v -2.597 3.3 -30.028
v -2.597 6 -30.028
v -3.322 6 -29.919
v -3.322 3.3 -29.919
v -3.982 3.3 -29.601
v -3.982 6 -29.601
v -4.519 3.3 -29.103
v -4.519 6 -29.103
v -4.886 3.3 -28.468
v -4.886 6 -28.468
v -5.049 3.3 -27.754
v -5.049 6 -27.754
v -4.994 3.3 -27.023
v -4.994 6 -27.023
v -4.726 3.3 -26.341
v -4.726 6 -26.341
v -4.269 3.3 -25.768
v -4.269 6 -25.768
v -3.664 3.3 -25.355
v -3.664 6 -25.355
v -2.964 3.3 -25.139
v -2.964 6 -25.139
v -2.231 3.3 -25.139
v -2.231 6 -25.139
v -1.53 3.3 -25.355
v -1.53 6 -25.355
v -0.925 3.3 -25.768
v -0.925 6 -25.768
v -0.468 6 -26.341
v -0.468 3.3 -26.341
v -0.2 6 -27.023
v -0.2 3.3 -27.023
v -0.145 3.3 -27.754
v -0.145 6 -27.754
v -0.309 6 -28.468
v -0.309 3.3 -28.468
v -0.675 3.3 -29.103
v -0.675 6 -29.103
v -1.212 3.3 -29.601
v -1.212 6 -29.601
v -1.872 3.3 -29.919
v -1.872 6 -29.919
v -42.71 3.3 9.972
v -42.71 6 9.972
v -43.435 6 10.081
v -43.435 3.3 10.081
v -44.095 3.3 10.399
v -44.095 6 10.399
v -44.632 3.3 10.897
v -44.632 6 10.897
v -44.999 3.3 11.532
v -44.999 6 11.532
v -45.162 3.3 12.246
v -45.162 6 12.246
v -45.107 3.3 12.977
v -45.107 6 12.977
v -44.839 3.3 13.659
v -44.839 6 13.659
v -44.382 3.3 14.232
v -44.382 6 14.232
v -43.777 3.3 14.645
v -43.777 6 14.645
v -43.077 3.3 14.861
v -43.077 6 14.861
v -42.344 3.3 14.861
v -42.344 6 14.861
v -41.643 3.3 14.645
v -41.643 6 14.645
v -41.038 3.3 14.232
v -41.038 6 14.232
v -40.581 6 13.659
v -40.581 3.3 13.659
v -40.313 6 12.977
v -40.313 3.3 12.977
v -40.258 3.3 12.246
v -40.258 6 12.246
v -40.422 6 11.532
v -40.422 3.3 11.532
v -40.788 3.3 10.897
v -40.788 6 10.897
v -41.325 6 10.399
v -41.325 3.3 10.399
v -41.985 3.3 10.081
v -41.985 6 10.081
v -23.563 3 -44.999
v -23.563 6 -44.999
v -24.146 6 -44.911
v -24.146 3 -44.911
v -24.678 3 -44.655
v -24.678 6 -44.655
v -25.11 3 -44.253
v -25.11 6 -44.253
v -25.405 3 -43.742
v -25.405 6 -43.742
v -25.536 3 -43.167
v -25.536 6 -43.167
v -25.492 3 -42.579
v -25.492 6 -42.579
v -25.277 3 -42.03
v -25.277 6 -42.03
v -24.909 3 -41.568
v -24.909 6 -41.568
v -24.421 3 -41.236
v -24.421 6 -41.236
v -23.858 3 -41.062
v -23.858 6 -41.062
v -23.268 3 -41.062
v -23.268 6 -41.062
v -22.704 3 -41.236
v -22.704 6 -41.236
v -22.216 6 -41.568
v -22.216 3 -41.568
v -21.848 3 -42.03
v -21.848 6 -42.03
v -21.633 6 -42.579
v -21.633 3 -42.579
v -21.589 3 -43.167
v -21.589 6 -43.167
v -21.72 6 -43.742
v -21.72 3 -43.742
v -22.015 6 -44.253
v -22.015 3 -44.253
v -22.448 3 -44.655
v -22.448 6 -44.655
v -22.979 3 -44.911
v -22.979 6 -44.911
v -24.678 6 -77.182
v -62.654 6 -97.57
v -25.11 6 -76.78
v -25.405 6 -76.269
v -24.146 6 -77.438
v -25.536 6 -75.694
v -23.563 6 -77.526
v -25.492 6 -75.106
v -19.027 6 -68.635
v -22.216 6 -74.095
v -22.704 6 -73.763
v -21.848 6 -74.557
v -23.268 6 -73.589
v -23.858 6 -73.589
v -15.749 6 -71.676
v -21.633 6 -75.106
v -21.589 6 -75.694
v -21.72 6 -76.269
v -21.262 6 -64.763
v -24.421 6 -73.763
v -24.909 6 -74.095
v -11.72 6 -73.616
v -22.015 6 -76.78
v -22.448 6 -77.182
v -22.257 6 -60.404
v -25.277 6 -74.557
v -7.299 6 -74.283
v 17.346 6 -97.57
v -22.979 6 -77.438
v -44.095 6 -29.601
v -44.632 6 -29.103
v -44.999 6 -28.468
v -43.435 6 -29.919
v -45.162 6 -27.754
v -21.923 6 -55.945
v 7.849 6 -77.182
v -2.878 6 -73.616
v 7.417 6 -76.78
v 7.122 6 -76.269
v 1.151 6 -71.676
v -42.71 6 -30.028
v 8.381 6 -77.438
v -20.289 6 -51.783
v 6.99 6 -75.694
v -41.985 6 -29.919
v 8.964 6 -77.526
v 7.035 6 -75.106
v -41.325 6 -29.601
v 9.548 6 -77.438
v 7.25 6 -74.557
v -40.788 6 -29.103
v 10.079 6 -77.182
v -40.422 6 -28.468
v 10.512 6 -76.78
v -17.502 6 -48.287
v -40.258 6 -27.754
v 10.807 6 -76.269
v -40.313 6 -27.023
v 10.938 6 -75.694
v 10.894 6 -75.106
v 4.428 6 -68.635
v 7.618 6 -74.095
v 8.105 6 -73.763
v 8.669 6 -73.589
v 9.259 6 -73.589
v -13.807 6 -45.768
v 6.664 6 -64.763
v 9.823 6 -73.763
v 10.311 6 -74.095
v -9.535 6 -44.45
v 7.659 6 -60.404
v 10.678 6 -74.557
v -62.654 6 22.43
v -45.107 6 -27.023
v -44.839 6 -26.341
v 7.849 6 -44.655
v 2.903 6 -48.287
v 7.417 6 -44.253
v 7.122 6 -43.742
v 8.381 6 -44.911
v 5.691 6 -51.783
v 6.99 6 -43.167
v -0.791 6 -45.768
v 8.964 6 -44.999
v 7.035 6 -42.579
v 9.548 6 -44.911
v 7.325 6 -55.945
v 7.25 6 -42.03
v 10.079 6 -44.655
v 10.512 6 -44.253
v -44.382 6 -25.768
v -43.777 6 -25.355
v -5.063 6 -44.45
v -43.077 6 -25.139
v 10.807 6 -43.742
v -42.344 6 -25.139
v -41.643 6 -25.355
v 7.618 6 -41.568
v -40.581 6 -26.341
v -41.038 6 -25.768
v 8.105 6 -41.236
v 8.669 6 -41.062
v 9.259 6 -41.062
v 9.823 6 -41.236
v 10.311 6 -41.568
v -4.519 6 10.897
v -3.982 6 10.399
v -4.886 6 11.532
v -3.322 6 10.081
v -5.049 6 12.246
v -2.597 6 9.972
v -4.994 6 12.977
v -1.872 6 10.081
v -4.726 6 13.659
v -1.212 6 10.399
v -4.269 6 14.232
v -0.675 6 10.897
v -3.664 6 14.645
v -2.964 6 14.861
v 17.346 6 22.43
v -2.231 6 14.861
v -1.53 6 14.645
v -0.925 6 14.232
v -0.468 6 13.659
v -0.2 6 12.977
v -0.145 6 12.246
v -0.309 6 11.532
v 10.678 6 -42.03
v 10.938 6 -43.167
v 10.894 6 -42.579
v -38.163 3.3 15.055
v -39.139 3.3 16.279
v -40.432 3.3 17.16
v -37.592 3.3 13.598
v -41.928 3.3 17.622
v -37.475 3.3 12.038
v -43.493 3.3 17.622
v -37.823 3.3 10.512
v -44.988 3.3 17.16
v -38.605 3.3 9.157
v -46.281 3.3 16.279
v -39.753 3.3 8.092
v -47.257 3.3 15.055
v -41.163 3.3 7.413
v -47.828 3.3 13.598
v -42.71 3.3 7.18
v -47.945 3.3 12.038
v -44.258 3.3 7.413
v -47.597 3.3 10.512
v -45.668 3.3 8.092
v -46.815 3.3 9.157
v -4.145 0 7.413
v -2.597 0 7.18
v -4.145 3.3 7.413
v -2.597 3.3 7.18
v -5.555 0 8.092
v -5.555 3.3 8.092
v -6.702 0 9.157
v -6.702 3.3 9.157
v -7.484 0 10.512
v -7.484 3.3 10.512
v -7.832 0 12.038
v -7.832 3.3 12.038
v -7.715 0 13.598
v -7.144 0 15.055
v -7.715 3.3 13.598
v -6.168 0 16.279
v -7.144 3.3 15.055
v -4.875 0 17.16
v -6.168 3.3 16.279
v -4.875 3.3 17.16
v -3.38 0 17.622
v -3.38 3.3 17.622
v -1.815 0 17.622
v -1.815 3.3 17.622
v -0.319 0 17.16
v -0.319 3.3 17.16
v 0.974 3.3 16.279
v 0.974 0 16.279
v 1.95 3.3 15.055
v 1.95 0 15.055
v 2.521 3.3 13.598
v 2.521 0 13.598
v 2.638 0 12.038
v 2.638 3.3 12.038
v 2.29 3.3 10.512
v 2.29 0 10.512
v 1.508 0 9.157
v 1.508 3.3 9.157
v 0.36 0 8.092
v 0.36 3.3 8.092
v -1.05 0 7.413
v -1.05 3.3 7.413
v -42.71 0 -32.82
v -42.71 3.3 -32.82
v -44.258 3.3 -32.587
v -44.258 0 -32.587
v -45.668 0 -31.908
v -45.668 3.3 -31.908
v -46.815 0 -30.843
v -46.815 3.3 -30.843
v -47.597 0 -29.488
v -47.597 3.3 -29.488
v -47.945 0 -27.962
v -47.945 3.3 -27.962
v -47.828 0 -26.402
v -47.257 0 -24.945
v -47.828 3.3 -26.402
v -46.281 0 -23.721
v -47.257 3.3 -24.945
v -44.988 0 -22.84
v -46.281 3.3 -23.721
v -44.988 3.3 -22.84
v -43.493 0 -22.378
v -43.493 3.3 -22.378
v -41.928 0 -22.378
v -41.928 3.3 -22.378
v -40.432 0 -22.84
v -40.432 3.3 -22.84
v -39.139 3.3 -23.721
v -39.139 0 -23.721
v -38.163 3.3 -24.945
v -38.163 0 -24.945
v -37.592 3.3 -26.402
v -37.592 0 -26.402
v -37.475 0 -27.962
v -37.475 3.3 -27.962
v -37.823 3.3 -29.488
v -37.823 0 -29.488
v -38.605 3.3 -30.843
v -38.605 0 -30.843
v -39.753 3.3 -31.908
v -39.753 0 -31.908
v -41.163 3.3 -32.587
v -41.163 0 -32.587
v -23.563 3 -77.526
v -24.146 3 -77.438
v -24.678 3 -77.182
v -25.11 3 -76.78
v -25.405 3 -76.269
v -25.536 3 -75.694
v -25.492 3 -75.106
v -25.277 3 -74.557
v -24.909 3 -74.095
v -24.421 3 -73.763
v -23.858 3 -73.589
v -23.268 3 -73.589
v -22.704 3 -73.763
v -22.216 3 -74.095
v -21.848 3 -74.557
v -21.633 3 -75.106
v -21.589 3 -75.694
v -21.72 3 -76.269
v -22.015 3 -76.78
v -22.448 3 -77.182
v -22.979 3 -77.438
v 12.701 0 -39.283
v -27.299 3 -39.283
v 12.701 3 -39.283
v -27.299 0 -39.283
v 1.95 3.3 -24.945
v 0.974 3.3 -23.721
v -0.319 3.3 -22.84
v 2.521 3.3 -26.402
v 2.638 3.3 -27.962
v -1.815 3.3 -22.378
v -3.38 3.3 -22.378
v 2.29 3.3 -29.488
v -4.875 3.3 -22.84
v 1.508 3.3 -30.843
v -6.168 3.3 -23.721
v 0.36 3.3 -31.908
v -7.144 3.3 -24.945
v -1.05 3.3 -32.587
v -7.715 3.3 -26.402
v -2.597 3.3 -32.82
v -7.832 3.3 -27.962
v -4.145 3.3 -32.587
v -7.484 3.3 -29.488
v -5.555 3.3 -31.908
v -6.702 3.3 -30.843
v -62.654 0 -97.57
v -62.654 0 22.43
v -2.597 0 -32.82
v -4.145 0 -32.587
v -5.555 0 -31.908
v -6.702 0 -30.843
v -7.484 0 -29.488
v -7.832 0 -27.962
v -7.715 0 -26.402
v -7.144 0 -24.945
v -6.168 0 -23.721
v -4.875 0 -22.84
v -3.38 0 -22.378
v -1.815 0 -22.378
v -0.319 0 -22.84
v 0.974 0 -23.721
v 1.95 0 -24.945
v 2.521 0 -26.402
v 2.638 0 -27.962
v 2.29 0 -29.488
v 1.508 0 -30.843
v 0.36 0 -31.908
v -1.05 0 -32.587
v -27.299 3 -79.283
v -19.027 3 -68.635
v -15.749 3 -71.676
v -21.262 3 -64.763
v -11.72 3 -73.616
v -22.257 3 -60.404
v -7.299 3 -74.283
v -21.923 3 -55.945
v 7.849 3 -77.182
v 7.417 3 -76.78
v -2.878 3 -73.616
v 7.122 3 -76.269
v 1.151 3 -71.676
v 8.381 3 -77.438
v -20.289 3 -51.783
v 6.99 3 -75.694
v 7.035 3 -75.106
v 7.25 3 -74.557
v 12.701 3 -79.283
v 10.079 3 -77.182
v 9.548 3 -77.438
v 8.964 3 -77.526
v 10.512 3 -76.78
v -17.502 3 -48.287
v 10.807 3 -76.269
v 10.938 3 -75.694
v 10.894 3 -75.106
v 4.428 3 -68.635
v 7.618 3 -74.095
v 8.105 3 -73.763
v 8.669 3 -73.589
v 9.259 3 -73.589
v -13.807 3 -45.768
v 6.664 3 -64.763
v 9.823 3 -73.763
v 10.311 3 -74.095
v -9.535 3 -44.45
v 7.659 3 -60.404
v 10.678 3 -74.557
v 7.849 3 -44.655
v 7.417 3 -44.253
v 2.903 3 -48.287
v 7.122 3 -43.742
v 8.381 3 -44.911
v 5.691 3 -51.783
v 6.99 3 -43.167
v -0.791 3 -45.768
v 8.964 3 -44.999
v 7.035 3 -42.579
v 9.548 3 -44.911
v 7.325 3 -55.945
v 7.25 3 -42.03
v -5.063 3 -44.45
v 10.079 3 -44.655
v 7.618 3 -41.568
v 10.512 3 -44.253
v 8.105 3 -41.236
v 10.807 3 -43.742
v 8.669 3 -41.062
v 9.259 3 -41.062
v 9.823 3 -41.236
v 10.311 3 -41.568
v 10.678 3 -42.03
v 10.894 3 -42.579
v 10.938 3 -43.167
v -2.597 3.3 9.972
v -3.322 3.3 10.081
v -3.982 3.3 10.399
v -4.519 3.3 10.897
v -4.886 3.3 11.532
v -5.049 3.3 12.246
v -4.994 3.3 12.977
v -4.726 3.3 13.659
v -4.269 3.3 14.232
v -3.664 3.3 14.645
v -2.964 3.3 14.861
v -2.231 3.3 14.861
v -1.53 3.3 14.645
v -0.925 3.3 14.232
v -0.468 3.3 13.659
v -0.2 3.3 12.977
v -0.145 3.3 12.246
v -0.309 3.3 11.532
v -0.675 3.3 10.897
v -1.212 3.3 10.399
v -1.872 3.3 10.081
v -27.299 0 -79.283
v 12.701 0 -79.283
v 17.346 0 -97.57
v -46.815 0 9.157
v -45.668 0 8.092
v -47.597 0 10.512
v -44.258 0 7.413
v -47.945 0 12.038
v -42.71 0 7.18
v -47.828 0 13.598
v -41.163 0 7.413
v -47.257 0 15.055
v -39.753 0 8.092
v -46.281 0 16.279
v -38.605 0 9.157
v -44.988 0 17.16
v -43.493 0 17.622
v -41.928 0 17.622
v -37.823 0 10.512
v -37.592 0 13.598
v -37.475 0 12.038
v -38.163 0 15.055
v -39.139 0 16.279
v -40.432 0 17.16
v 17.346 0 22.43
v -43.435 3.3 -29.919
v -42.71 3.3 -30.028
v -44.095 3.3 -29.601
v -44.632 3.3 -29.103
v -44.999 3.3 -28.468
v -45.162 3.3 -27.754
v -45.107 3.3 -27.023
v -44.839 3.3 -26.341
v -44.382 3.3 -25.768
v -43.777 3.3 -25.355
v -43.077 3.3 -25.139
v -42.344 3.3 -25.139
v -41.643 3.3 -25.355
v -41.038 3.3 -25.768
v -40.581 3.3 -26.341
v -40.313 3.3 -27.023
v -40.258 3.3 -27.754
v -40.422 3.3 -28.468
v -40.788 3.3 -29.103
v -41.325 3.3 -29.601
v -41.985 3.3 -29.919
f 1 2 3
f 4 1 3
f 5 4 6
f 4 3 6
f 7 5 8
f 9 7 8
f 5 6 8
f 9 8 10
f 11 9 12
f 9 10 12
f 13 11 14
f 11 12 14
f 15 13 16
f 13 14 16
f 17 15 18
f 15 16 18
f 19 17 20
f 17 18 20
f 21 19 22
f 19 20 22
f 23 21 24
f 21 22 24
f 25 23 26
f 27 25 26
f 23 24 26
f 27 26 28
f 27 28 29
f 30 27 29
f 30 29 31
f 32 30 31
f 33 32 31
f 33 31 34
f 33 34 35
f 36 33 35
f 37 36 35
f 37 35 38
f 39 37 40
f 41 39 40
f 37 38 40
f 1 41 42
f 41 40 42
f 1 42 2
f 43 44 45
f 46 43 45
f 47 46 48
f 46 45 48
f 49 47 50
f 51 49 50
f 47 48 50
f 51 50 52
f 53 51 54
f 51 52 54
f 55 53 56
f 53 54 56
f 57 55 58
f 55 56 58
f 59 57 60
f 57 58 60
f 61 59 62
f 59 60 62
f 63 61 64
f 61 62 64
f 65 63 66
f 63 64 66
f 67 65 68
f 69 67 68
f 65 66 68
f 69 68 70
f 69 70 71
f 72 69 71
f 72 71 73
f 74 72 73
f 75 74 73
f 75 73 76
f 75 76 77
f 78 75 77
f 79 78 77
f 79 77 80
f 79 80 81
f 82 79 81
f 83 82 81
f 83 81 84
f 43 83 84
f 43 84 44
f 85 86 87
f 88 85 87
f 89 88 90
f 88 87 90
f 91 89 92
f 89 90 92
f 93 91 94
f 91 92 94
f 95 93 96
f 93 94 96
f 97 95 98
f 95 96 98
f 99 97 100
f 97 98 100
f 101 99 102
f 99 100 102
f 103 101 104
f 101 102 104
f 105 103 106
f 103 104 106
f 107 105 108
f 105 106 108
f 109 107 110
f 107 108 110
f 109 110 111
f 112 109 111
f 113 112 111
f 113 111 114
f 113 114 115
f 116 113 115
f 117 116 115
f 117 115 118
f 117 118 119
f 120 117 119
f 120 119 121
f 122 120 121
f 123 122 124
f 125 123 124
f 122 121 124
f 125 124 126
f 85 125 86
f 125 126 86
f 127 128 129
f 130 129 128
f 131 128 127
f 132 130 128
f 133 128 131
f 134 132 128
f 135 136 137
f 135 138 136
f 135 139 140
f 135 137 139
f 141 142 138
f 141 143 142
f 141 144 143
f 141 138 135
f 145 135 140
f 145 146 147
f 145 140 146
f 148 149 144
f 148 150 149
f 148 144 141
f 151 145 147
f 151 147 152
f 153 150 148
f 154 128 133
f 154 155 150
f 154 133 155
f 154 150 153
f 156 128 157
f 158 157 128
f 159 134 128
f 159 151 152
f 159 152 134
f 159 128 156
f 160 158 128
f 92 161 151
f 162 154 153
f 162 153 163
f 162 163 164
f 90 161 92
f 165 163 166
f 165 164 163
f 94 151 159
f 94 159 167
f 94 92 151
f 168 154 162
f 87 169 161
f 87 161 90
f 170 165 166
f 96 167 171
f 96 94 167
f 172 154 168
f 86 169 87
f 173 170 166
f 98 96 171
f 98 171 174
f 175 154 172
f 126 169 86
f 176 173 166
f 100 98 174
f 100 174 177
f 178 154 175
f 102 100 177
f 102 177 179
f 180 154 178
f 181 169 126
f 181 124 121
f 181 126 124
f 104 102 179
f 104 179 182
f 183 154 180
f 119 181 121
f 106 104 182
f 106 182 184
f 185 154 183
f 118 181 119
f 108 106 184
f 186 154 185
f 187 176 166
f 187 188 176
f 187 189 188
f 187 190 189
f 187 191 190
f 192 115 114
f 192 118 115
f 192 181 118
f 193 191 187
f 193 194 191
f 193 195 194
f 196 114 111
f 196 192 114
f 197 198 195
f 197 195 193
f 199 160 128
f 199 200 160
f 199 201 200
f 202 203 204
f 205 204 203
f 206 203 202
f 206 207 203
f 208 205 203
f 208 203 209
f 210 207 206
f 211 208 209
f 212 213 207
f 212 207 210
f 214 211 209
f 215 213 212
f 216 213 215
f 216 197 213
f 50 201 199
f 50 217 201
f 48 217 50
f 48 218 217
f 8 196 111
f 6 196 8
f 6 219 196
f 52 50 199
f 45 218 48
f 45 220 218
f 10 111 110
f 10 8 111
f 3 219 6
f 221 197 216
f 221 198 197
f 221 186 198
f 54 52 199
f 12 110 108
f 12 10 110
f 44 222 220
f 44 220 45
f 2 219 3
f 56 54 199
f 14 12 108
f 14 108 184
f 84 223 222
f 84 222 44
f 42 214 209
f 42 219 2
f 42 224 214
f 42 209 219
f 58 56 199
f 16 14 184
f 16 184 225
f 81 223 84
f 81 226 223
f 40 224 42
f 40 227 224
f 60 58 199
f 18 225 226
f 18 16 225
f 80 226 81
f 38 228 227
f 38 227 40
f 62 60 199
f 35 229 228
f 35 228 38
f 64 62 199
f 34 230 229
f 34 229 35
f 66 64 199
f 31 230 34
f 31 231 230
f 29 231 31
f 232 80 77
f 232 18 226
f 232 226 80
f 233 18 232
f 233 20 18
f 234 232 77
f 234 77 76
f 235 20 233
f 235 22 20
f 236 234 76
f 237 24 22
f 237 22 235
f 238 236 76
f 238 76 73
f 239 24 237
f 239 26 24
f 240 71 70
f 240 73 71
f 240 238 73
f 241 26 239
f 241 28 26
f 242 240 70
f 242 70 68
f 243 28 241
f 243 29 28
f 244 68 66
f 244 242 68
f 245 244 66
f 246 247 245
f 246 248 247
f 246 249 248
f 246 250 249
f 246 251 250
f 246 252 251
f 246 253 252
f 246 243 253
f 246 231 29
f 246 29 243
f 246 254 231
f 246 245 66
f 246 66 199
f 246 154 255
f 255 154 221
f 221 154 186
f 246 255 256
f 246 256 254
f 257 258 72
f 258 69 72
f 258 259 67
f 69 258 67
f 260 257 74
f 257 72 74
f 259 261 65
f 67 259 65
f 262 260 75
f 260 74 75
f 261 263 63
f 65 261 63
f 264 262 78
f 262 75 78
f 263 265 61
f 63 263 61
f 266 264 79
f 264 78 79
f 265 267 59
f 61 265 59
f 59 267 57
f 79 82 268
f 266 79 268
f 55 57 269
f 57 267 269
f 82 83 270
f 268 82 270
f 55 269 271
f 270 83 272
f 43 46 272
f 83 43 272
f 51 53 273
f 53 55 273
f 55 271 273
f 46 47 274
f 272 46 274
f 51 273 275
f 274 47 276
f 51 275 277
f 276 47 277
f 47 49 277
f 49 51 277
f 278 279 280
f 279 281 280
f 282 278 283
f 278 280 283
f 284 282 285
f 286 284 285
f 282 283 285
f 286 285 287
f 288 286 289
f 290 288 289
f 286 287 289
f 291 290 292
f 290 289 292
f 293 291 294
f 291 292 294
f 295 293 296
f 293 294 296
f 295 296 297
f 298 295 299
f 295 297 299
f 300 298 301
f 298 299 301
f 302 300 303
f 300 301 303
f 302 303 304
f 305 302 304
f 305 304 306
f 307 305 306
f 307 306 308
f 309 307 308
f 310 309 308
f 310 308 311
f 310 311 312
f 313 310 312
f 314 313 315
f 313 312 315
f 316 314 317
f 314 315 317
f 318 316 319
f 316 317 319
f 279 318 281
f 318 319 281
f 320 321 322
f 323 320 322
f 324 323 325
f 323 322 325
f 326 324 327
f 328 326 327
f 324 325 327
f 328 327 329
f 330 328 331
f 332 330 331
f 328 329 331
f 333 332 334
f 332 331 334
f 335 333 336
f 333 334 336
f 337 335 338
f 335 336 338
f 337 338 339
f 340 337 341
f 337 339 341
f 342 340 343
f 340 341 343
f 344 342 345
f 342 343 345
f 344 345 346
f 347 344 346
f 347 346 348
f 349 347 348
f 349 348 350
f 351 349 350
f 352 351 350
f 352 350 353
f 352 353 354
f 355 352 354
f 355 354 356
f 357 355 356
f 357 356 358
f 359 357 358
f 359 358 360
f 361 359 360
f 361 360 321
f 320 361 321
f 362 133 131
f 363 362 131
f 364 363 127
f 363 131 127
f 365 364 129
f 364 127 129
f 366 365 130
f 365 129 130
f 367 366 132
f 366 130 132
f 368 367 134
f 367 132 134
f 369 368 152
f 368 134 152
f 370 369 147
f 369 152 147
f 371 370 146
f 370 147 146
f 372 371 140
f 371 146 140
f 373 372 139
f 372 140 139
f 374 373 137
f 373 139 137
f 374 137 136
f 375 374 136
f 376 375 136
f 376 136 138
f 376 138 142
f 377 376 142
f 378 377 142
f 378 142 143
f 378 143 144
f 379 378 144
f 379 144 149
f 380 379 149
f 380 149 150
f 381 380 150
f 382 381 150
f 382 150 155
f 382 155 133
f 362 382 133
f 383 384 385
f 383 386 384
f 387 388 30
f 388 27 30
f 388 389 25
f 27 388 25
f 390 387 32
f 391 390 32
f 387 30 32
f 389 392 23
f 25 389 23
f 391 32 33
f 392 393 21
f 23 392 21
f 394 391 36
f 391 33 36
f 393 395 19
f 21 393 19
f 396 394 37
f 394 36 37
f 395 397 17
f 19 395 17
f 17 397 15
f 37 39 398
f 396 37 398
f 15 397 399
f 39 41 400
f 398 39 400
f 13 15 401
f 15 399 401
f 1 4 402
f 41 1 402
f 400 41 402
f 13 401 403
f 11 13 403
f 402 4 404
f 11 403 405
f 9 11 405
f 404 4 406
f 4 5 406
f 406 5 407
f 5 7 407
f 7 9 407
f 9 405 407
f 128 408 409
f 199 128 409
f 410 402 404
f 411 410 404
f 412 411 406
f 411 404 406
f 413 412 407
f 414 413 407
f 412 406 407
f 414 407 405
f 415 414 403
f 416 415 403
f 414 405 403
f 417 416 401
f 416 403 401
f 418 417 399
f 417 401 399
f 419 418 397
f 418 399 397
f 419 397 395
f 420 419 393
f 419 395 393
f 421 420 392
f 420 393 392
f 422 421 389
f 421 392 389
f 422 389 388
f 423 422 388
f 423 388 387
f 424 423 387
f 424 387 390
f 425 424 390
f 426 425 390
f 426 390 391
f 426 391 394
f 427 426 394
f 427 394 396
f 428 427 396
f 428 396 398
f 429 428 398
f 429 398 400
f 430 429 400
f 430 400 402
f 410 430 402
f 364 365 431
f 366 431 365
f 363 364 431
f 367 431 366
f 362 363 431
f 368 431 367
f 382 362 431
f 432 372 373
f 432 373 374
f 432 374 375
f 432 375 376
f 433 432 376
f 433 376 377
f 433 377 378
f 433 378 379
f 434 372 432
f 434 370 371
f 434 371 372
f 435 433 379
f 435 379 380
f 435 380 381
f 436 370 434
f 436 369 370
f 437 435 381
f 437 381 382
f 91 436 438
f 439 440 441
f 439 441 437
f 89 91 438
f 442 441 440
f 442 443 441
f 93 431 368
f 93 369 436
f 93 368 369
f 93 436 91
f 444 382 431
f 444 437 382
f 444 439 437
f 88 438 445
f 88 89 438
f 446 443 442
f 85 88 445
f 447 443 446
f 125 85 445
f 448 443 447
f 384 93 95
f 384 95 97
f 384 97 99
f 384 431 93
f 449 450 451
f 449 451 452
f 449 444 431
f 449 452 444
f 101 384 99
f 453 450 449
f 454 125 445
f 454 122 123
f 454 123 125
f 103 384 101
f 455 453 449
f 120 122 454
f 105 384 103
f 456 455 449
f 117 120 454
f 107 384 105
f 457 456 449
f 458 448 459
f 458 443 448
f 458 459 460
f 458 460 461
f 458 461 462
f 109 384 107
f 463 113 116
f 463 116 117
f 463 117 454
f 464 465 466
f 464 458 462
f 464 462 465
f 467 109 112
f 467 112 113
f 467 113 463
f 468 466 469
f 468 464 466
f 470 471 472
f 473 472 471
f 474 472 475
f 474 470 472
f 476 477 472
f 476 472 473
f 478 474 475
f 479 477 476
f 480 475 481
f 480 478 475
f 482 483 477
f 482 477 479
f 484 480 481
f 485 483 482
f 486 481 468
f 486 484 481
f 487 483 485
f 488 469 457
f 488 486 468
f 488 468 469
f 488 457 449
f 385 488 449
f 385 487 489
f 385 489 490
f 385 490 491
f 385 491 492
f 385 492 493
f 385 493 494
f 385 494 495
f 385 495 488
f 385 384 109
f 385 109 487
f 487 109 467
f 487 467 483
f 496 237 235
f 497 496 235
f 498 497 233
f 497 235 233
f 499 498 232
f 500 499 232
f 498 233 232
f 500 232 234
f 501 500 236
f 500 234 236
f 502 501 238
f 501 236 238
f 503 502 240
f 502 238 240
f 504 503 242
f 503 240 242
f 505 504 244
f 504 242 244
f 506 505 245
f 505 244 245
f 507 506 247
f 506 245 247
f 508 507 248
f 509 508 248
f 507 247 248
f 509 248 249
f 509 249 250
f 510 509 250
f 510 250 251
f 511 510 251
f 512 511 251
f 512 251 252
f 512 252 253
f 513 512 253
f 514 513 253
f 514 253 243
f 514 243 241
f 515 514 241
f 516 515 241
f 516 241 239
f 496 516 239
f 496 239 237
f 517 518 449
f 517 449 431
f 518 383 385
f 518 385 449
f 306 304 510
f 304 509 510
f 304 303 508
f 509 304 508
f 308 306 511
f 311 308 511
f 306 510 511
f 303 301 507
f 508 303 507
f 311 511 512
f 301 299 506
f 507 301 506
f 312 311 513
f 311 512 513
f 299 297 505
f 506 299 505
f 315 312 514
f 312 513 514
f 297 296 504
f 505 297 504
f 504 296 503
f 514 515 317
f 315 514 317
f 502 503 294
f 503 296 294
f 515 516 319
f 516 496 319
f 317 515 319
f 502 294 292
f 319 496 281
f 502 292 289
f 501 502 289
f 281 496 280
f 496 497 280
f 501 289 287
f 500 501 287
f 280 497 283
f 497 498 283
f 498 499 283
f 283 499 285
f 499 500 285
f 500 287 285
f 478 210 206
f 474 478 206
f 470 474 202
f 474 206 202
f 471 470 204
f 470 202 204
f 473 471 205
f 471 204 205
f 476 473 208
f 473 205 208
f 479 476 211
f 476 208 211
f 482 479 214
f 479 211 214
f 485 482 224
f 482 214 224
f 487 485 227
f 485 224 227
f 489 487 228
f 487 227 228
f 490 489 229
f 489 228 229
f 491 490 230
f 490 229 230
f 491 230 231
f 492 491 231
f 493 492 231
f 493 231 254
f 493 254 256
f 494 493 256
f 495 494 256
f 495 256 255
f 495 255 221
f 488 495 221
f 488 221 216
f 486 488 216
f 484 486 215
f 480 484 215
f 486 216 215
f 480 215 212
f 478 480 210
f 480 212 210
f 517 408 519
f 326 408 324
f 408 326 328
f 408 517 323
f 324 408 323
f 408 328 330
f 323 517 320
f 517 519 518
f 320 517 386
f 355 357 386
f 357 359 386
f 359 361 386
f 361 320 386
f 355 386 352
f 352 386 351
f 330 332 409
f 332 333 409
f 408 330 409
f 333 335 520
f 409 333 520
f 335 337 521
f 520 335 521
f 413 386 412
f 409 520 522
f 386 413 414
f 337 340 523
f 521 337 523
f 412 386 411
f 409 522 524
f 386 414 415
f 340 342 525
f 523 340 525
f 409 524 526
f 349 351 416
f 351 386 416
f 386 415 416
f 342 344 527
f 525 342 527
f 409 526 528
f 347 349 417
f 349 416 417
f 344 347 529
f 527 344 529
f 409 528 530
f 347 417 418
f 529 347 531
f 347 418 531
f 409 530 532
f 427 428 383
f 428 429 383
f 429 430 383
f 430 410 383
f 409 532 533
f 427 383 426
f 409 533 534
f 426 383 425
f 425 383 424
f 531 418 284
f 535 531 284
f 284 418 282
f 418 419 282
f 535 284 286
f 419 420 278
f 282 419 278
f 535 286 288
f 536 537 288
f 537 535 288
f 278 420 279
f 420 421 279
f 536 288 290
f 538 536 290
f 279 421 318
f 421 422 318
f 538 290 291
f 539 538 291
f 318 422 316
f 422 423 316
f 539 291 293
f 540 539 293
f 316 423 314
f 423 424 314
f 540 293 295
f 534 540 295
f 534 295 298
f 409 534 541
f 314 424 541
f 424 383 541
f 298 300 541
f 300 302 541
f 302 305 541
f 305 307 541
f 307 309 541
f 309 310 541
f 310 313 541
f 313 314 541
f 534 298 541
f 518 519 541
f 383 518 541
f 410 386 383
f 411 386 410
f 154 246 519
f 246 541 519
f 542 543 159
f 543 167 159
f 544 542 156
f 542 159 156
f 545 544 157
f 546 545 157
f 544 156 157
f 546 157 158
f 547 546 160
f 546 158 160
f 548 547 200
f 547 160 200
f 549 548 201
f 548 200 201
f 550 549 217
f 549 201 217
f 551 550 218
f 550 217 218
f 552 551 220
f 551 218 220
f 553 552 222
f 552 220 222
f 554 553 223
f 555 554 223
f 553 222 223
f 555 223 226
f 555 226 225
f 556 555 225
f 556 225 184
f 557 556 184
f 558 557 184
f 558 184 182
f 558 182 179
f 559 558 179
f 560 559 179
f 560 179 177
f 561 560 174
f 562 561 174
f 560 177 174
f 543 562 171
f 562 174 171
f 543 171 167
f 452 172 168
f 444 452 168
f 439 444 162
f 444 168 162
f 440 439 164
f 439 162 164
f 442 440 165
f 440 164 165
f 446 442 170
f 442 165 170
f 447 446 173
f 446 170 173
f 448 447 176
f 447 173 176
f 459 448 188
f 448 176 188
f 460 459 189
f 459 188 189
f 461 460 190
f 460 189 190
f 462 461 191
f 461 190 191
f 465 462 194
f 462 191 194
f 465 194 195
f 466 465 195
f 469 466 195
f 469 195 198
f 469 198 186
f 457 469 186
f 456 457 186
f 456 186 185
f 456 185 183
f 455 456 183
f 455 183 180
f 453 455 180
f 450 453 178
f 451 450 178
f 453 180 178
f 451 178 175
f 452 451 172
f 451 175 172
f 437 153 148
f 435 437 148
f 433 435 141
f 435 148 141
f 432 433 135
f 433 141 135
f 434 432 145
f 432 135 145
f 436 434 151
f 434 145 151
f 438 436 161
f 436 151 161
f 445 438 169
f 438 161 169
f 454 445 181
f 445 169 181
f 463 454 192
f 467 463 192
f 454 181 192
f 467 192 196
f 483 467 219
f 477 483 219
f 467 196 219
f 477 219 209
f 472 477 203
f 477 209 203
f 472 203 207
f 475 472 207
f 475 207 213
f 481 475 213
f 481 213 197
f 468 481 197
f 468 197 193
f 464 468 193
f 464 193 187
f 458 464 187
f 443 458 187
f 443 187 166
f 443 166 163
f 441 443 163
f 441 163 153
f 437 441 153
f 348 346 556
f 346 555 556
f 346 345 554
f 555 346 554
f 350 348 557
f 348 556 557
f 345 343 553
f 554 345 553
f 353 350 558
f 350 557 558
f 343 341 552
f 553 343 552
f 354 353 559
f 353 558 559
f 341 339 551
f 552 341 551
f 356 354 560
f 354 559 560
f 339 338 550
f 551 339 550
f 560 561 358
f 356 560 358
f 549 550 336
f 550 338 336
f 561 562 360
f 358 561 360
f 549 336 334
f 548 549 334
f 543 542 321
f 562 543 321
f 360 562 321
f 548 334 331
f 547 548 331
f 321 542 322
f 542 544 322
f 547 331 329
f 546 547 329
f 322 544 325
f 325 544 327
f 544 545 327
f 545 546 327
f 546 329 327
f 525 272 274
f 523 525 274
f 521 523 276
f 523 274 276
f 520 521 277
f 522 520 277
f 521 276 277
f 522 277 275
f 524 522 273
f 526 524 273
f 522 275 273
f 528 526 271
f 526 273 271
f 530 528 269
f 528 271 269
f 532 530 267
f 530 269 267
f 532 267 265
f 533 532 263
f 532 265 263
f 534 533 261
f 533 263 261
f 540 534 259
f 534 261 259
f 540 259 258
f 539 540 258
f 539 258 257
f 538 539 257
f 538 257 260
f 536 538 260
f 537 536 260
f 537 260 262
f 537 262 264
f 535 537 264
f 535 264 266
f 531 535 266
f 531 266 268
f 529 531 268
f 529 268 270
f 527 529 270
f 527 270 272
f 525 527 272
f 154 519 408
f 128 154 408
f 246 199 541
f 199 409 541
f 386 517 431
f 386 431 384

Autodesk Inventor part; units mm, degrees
ref_plane "YZ Plane" through (0, 0, 0) normal (1, 0, 0) x (0, 1, 0)
ref_plane "XZ Plane" through (0, 0, 0) normal (0, 1, 0) x (-1, 0, 0)
ref_plane "XY Plane" through (0, 0, 0) normal (0, 0, 1) x (1, 0, 0)
sketch "Schizzo1" plane through (0, 0, 0) normal (0, 1, 0) x (-1, 0, 0)
  line L0 (87.6536, 7.4302) -> (-32.3464, 7.4302)
  line L1 (-32.3464, 7.4302) -> (-32.3464, -72.5698)
  line L2 (-32.3464, -72.5698) -> (87.6536, -72.5698)
  line L3 (87.6536, -72.5698) -> (87.6536, 7.4302)
  point P0 (0, 0)
  dimension "d0" = 80
  dimension "d1" = 120
extrude "Estrusione1" add sketch "Schizzo1" along normal blind 6
move or copy body "Sposta corpo1" bodies to move or copy 1 copy no rotation origin (0, 0, 0) rotation axis (0, 1, 0) rotation angle 90 translate (9.9162, 0, -65.2235)
sketch "Schizzo7" plane through (-62.6536, 0, -97.5698) normal (0, -1, 0) x (1, 0, 0)
  circle A0 centre (19.9435, 110) radius 4
  circle A1 centre (19.9435, 70) radius 4
  circle A2 centre (60.0565, 70) radius 4
  circle A3 centre (60.0565, 110) radius 4
hole "Foro1" at (-2.5971, 0, 12.4302) at (-2.5971, 0, -27.5698) at (-42.7101, 0, -27.5698) at (-42.7101, 0, 12.4302) direction (0, 1, 0) diameter 4.917 end through all counterbore diameter 10.5 counterbore depth 3.3 thread size "M6x1" class "6H" standard "ANSI Metric M Profile"
sketch "Schizzo8" plane through (-62.6536, 0, -97.5698) normal (0, -1, 0) x (1, 0, 0)
  line L0 (75.3545, 58.287) -> (35.3545, 58.287)
  line L1 (35.3545, 58.287) -> (35.3545, 18.287)
  line L2 (35.3545, 18.287) -> (75.3545, 18.287)
  line L3 (75.3545, 18.287) -> (75.3545, 58.287)
  circle A0 centre (55.3545, 38.287) radius 15
  circle A1 centre (39.0911, 54.5505) radius 2.25
  circle A2 centre (71.618, 54.5505) radius 2.25
  circle A3 centre (39.0911, 22.0236) radius 2.25
  circle A4 centre (71.618, 22.0236) radius 2.25
  point P0 (62.6536, 97.5698)
  dimension "d14" = 30
  dimension "d16" = 4.5
  dimension "d17" = 4.5
  dimension "d18" = 4.5
  dimension "d19" = 4.5
hole "Foro2" at (8.9643, 0, -43.0193) direction (0, 1, 0) diameter 3.9587 depth 6 thread size "M4.5x0.5" class "6H" standard "ANSI Metric M Profile"
hole "Foro3" at (-23.5626, 0, -43.0193) direction (0, 1, 0) diameter 3.9587 depth 6 thread size "M4.5x0.5" class "6H" standard "ANSI Metric M Profile"
hole "Foro4" at (-23.5626, 0, -75.5463) direction (0, 1, 0) diameter 3.9587 depth 6 thread size "M4.5x0.5" class "6H" standard "ANSI Metric M Profile"
hole "Foro5" at (8.9643, 0, -75.5463) direction (0, 1, 0) diameter 3.9587 depth 6 thread size "M4.5x0.5" class "6H" standard "ANSI Metric M Profile"
sketch "Schizzo9" plane through (-62.6536, 0, -97.5698) normal (0, -1, 0) x (1, 0, 0)
  line L0 (35.3545, 58.287) -> (75.3545, 58.287)
  line L1 (75.3545, 58.287) -> (75.3545, 18.287)
  line L2 (75.3545, 18.287) -> (35.3545, 18.287)
  line L3 (35.3545, 18.287) -> (35.3545, 58.287)
  point P0 (62.6536, 97.5698)
  point P1 (35.3545, 18.287)
  point P2 (75.3545, 58.287)
  point P3 (55.3545, 38.287)
extrude "Estrusione2" cut sketch "Schizzo9" against normal blind 3
hole "Foro6" at (-7.2991, 0, -59.2828) direction (0, 1, 0) diameter 30 depth 6
equation "\"RaggioPiega\" = Spessore"
equation "\"LarghezzaScaricoPiega\" = Spessore"
equation "\"ProfonditàScaricoPiega\" = 0.5 * Spessore"
equation "\"DimensioniScaricoAngolo\" = 4 * Spessore"
equation "\"ResiduoMinimo\" = 2 * Spessore"
equation "\"RaggioTransizione\" = RaggioPiega"
equation "\"Dimensione_raggio_Jacobi\" = RaggioPiega"
equation "\"DimensioneGioco\" = Spessore"
equation "\"Spessore\" = 0.5"
properties part number "Platform"
